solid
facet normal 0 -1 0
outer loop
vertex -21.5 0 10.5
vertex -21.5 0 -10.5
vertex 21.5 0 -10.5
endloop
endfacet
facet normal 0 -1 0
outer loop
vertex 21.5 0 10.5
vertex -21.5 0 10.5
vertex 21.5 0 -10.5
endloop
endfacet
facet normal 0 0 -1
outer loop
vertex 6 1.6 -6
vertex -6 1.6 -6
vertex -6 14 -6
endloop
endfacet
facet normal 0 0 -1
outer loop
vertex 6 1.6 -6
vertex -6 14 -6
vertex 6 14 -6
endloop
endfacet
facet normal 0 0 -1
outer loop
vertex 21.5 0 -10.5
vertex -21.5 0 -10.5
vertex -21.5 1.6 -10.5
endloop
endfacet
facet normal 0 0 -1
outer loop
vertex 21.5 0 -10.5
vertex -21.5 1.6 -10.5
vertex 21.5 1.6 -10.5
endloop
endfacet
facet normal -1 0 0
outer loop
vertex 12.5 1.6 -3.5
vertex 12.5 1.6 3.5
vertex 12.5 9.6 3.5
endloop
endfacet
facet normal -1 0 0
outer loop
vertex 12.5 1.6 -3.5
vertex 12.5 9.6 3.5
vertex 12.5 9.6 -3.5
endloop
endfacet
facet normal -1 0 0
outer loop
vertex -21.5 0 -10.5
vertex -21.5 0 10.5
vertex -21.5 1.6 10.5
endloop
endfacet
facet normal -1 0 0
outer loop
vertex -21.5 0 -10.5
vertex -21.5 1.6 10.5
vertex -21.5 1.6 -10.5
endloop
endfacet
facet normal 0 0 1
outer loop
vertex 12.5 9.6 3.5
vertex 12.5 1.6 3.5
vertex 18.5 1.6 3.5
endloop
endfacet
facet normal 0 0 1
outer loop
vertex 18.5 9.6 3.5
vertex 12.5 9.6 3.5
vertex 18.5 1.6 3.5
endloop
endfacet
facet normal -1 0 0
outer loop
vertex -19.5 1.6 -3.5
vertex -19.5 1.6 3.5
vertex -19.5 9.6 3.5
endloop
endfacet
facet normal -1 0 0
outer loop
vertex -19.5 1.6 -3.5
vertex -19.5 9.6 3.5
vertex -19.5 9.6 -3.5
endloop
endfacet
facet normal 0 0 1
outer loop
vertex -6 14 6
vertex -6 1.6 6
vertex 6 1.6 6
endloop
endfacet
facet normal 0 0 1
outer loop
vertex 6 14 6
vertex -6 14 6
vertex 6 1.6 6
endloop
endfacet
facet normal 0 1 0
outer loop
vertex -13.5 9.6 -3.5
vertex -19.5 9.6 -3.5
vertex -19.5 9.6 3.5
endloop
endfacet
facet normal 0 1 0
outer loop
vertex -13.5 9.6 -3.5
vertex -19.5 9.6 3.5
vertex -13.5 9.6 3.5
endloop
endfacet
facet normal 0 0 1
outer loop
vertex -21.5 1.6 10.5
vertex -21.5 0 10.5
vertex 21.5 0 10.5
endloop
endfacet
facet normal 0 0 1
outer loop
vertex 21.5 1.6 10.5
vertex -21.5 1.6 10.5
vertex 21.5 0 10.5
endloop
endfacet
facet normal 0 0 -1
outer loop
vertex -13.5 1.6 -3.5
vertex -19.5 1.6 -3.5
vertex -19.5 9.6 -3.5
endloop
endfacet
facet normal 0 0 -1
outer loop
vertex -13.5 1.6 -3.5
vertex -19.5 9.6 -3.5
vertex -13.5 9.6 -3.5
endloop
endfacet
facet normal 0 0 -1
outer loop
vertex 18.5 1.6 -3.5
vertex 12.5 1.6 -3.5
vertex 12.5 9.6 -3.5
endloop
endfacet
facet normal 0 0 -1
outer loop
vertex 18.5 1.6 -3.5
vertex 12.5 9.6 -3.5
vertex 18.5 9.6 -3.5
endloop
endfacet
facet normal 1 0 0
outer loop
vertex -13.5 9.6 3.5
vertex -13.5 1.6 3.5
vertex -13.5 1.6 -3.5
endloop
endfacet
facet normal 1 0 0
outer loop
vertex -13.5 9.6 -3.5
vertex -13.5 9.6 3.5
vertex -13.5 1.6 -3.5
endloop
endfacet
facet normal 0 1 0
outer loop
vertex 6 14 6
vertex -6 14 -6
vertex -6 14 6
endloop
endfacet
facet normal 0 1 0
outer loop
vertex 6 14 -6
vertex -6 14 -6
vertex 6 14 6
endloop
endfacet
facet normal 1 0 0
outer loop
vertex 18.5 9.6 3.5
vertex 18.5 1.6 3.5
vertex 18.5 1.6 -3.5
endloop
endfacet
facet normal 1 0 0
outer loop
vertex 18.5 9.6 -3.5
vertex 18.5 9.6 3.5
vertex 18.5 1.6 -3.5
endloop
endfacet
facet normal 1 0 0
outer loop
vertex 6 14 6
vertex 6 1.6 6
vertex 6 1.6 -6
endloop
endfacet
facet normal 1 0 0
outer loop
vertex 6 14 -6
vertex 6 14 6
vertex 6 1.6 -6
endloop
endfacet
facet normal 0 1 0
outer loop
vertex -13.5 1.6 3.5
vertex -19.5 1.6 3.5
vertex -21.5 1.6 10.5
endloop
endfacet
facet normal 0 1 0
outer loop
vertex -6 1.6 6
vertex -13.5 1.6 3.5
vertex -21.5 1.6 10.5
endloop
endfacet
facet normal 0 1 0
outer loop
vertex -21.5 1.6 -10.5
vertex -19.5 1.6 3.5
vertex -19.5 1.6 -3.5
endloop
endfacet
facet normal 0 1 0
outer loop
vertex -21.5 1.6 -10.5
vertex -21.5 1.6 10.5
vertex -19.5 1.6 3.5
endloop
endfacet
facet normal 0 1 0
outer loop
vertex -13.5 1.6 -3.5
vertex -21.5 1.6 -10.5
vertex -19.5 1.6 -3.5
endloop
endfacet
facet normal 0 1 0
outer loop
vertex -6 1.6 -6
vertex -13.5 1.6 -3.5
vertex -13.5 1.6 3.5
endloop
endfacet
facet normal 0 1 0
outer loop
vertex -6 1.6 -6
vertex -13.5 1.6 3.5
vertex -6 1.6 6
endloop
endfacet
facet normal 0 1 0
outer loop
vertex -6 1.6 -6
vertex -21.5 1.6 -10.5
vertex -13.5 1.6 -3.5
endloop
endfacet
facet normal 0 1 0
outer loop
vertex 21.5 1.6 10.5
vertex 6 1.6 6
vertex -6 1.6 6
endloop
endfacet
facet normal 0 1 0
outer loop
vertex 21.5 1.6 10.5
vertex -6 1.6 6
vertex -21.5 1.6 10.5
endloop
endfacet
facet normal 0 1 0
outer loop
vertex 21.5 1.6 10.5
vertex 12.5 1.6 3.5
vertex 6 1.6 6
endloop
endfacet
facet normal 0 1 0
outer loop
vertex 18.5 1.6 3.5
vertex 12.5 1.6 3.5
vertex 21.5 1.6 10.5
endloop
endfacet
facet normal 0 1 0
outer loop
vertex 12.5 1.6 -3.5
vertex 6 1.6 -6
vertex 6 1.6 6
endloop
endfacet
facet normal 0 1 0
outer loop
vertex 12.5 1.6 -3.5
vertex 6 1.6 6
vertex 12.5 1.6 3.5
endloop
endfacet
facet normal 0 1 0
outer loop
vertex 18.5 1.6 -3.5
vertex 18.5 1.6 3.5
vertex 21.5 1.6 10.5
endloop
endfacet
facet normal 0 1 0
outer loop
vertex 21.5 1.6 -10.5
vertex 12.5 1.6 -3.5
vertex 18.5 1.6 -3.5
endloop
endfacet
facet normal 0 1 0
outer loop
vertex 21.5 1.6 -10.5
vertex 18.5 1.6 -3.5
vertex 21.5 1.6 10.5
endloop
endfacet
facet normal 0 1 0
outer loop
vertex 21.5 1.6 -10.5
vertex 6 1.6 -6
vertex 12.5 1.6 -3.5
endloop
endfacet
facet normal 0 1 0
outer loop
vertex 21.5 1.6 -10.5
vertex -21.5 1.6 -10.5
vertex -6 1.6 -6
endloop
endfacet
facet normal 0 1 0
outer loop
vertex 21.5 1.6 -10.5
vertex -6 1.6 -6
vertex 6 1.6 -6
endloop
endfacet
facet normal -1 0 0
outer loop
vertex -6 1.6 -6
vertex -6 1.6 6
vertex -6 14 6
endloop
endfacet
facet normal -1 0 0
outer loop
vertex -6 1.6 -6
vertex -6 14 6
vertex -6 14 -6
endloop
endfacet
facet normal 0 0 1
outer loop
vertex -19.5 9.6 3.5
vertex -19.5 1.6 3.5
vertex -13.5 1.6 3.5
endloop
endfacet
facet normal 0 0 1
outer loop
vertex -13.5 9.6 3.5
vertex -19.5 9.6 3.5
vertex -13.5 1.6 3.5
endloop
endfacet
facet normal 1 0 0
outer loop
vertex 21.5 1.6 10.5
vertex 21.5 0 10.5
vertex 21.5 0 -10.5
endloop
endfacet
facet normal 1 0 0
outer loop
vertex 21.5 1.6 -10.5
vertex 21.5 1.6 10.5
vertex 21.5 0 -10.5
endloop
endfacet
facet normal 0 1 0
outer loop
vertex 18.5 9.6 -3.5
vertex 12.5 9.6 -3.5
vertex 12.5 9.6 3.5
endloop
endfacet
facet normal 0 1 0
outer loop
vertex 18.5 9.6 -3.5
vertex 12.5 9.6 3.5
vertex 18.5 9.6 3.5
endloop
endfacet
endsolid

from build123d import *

# Parameters (mm, degrees)
SKETCH1_W        = 43
SKETCH1_H        = 21
BOARD_DEPTH      = 1.6
INDUCTOR_START   = 1.6
SKETCH2_W        = 12
SKETCH2_H        = 12
INDUCTOR_DEPTH   = 12.4
INPUT_CAP_START  = 1.6
SKETCH3_W        = 6
SKETCH3_H        = 7
INPUT_CAP_DEPTH  = 8
OUTPUT_CAP_START = 1.6
SKETCH4_W        = 6
SKETCH4_H        = 7
OUTPUT_CAP_DEPTH = 8


with BuildPart() as part:
    # Sketch1 → Board (new body)
    with BuildSketch(Plane(origin=(0, 0, 0), x_dir=(1, 0, 0), z_dir=(0, 1, 0))):
        Rectangle(SKETCH1_W, SKETCH1_H)
    extrude(amount=BOARD_DEPTH)

    # Sketch2 → Inductor (add)
    with BuildSketch(Plane(origin=(0, 0, 0), x_dir=(1, 0, 0), z_dir=(0, 1, 0)).offset(INDUCTOR_START)):
        Rectangle(SKETCH2_W, SKETCH2_H)
    extrude(amount=INDUCTOR_DEPTH)

    # Sketch3 → Input_Cap (add)
    with BuildSketch(Plane(origin=(0, 0, 0), x_dir=(1, 0, 0), z_dir=(0, 1, 0)).offset(INPUT_CAP_START)):
        with Locations((-16.5, 0)):
            Rectangle(SKETCH3_W, SKETCH3_H)
    extrude(amount=INPUT_CAP_DEPTH)

    # Sketch4 → Output_Cap (add)
    with BuildSketch(Plane(origin=(0, 0, 0), x_dir=(1, 0, 0), z_dir=(0, 1, 0)).offset(OUTPUT_CAP_START)):
        with Locations((15.5, 0)):
            Rectangle(SKETCH4_W, SKETCH4_H)
    extrude(amount=OUTPUT_CAP_DEPTH)


solid = part.part
